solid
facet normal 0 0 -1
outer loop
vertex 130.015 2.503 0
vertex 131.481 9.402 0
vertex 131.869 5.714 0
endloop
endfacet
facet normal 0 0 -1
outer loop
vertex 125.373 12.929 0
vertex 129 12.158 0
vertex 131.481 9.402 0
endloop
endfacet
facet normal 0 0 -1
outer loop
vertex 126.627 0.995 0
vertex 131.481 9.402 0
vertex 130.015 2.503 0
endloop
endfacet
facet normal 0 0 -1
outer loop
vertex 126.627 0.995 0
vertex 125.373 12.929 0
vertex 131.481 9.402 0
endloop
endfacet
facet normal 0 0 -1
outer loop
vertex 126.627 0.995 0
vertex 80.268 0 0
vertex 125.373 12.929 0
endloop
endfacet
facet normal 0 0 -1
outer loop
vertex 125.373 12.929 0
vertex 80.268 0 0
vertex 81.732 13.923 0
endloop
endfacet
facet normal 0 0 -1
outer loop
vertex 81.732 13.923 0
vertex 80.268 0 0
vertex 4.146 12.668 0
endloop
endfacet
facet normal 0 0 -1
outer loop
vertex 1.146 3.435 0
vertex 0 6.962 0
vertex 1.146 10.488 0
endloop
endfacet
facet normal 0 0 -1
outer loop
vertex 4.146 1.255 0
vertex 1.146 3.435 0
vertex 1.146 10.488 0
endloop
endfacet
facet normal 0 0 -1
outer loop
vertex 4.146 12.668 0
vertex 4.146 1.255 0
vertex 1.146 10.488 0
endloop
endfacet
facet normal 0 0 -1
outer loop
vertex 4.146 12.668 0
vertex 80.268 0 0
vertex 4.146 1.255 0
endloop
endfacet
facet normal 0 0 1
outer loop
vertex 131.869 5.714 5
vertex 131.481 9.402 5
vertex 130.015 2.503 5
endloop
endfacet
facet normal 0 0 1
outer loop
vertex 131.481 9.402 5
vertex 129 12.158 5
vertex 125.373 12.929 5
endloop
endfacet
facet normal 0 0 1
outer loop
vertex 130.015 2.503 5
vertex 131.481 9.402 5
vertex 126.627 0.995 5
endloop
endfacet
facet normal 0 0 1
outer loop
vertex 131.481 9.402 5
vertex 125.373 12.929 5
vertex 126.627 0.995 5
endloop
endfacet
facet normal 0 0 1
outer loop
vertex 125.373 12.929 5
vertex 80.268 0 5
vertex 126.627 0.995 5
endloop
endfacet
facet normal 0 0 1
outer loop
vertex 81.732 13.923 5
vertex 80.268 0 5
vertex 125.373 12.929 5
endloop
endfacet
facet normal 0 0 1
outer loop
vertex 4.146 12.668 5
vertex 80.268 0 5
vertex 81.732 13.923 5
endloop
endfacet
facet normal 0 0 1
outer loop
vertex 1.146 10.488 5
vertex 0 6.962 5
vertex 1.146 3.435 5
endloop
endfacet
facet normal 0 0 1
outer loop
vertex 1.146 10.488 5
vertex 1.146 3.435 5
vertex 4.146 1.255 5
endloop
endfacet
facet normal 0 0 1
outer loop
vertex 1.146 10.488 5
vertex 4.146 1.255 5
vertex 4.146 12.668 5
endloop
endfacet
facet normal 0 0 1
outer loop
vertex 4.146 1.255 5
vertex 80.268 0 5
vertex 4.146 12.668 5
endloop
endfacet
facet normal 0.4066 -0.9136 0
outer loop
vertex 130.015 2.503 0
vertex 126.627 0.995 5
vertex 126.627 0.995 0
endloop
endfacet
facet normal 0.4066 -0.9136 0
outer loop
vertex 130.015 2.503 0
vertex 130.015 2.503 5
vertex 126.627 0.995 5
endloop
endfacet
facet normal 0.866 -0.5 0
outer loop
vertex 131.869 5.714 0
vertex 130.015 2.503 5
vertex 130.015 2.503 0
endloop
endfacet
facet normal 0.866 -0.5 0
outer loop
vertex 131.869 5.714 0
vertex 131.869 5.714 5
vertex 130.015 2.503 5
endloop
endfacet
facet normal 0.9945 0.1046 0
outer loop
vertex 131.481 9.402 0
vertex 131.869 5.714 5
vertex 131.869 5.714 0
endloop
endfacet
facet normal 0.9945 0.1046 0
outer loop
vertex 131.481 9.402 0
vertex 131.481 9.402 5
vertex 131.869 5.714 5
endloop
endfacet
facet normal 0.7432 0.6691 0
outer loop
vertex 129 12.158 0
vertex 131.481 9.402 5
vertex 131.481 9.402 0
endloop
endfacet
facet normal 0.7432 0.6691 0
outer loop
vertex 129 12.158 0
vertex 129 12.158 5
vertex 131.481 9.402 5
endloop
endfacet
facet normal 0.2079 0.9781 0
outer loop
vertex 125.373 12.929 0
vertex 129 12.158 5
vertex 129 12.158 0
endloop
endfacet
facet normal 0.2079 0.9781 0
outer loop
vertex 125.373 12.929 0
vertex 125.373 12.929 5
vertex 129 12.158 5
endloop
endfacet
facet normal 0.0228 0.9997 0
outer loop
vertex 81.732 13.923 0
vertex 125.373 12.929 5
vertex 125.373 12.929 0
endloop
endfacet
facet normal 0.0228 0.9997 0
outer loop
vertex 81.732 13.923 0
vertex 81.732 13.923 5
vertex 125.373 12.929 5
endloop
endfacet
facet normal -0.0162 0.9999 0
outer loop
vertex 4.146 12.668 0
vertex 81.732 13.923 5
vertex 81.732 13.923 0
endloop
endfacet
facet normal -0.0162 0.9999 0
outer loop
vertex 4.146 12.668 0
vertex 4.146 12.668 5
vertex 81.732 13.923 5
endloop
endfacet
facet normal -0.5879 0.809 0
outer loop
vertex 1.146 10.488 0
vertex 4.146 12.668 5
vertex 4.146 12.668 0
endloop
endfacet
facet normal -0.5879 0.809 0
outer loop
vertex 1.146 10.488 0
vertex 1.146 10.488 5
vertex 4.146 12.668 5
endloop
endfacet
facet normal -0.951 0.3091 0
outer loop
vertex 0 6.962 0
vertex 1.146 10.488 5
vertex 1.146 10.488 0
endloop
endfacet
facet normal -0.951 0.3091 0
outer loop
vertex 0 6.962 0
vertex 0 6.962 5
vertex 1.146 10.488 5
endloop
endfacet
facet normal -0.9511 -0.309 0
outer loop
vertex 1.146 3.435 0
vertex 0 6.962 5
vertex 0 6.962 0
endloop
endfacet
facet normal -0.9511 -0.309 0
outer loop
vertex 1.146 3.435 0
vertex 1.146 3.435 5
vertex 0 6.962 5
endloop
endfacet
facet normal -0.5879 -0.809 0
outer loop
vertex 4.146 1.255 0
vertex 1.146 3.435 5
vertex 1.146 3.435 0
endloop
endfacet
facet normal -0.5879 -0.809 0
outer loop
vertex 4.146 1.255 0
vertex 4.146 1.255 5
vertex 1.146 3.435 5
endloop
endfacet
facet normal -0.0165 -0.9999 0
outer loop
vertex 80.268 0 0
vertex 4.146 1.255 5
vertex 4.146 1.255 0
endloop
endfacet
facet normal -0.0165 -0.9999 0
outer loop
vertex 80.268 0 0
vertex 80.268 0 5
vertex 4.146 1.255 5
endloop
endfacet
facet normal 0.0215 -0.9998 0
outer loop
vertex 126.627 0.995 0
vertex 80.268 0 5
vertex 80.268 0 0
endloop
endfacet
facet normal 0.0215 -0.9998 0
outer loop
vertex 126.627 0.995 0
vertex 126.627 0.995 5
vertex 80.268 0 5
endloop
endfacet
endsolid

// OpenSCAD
$fn = 32;

// ----------------------------------------------------------------------
// Lever arm: two bosses 12 and 14 mm, 75 mm between centres
// ----------------------------------------------------------------------

// --- parameters (mm) ---
profile_height = 5;       // extrusion height
profile_points = 13;      // points of the closed outline

profile = [[0, 6.962], [1.146, 3.435], [4.146, 1.255], [80.268, 0], [126.627, 0.995], [130.015, 2.503], [131.869, 5.714], [131.481, 9.402], [129, 12.158], [125.373, 12.929], [81.732, 13.923], [4.146, 12.668], [1.146, 10.488]];  // single closed polygon, 13 points, counter clockwise

// --- the one profile operation ---
linear_extrude(height = profile_height) polygon(points = profile);
